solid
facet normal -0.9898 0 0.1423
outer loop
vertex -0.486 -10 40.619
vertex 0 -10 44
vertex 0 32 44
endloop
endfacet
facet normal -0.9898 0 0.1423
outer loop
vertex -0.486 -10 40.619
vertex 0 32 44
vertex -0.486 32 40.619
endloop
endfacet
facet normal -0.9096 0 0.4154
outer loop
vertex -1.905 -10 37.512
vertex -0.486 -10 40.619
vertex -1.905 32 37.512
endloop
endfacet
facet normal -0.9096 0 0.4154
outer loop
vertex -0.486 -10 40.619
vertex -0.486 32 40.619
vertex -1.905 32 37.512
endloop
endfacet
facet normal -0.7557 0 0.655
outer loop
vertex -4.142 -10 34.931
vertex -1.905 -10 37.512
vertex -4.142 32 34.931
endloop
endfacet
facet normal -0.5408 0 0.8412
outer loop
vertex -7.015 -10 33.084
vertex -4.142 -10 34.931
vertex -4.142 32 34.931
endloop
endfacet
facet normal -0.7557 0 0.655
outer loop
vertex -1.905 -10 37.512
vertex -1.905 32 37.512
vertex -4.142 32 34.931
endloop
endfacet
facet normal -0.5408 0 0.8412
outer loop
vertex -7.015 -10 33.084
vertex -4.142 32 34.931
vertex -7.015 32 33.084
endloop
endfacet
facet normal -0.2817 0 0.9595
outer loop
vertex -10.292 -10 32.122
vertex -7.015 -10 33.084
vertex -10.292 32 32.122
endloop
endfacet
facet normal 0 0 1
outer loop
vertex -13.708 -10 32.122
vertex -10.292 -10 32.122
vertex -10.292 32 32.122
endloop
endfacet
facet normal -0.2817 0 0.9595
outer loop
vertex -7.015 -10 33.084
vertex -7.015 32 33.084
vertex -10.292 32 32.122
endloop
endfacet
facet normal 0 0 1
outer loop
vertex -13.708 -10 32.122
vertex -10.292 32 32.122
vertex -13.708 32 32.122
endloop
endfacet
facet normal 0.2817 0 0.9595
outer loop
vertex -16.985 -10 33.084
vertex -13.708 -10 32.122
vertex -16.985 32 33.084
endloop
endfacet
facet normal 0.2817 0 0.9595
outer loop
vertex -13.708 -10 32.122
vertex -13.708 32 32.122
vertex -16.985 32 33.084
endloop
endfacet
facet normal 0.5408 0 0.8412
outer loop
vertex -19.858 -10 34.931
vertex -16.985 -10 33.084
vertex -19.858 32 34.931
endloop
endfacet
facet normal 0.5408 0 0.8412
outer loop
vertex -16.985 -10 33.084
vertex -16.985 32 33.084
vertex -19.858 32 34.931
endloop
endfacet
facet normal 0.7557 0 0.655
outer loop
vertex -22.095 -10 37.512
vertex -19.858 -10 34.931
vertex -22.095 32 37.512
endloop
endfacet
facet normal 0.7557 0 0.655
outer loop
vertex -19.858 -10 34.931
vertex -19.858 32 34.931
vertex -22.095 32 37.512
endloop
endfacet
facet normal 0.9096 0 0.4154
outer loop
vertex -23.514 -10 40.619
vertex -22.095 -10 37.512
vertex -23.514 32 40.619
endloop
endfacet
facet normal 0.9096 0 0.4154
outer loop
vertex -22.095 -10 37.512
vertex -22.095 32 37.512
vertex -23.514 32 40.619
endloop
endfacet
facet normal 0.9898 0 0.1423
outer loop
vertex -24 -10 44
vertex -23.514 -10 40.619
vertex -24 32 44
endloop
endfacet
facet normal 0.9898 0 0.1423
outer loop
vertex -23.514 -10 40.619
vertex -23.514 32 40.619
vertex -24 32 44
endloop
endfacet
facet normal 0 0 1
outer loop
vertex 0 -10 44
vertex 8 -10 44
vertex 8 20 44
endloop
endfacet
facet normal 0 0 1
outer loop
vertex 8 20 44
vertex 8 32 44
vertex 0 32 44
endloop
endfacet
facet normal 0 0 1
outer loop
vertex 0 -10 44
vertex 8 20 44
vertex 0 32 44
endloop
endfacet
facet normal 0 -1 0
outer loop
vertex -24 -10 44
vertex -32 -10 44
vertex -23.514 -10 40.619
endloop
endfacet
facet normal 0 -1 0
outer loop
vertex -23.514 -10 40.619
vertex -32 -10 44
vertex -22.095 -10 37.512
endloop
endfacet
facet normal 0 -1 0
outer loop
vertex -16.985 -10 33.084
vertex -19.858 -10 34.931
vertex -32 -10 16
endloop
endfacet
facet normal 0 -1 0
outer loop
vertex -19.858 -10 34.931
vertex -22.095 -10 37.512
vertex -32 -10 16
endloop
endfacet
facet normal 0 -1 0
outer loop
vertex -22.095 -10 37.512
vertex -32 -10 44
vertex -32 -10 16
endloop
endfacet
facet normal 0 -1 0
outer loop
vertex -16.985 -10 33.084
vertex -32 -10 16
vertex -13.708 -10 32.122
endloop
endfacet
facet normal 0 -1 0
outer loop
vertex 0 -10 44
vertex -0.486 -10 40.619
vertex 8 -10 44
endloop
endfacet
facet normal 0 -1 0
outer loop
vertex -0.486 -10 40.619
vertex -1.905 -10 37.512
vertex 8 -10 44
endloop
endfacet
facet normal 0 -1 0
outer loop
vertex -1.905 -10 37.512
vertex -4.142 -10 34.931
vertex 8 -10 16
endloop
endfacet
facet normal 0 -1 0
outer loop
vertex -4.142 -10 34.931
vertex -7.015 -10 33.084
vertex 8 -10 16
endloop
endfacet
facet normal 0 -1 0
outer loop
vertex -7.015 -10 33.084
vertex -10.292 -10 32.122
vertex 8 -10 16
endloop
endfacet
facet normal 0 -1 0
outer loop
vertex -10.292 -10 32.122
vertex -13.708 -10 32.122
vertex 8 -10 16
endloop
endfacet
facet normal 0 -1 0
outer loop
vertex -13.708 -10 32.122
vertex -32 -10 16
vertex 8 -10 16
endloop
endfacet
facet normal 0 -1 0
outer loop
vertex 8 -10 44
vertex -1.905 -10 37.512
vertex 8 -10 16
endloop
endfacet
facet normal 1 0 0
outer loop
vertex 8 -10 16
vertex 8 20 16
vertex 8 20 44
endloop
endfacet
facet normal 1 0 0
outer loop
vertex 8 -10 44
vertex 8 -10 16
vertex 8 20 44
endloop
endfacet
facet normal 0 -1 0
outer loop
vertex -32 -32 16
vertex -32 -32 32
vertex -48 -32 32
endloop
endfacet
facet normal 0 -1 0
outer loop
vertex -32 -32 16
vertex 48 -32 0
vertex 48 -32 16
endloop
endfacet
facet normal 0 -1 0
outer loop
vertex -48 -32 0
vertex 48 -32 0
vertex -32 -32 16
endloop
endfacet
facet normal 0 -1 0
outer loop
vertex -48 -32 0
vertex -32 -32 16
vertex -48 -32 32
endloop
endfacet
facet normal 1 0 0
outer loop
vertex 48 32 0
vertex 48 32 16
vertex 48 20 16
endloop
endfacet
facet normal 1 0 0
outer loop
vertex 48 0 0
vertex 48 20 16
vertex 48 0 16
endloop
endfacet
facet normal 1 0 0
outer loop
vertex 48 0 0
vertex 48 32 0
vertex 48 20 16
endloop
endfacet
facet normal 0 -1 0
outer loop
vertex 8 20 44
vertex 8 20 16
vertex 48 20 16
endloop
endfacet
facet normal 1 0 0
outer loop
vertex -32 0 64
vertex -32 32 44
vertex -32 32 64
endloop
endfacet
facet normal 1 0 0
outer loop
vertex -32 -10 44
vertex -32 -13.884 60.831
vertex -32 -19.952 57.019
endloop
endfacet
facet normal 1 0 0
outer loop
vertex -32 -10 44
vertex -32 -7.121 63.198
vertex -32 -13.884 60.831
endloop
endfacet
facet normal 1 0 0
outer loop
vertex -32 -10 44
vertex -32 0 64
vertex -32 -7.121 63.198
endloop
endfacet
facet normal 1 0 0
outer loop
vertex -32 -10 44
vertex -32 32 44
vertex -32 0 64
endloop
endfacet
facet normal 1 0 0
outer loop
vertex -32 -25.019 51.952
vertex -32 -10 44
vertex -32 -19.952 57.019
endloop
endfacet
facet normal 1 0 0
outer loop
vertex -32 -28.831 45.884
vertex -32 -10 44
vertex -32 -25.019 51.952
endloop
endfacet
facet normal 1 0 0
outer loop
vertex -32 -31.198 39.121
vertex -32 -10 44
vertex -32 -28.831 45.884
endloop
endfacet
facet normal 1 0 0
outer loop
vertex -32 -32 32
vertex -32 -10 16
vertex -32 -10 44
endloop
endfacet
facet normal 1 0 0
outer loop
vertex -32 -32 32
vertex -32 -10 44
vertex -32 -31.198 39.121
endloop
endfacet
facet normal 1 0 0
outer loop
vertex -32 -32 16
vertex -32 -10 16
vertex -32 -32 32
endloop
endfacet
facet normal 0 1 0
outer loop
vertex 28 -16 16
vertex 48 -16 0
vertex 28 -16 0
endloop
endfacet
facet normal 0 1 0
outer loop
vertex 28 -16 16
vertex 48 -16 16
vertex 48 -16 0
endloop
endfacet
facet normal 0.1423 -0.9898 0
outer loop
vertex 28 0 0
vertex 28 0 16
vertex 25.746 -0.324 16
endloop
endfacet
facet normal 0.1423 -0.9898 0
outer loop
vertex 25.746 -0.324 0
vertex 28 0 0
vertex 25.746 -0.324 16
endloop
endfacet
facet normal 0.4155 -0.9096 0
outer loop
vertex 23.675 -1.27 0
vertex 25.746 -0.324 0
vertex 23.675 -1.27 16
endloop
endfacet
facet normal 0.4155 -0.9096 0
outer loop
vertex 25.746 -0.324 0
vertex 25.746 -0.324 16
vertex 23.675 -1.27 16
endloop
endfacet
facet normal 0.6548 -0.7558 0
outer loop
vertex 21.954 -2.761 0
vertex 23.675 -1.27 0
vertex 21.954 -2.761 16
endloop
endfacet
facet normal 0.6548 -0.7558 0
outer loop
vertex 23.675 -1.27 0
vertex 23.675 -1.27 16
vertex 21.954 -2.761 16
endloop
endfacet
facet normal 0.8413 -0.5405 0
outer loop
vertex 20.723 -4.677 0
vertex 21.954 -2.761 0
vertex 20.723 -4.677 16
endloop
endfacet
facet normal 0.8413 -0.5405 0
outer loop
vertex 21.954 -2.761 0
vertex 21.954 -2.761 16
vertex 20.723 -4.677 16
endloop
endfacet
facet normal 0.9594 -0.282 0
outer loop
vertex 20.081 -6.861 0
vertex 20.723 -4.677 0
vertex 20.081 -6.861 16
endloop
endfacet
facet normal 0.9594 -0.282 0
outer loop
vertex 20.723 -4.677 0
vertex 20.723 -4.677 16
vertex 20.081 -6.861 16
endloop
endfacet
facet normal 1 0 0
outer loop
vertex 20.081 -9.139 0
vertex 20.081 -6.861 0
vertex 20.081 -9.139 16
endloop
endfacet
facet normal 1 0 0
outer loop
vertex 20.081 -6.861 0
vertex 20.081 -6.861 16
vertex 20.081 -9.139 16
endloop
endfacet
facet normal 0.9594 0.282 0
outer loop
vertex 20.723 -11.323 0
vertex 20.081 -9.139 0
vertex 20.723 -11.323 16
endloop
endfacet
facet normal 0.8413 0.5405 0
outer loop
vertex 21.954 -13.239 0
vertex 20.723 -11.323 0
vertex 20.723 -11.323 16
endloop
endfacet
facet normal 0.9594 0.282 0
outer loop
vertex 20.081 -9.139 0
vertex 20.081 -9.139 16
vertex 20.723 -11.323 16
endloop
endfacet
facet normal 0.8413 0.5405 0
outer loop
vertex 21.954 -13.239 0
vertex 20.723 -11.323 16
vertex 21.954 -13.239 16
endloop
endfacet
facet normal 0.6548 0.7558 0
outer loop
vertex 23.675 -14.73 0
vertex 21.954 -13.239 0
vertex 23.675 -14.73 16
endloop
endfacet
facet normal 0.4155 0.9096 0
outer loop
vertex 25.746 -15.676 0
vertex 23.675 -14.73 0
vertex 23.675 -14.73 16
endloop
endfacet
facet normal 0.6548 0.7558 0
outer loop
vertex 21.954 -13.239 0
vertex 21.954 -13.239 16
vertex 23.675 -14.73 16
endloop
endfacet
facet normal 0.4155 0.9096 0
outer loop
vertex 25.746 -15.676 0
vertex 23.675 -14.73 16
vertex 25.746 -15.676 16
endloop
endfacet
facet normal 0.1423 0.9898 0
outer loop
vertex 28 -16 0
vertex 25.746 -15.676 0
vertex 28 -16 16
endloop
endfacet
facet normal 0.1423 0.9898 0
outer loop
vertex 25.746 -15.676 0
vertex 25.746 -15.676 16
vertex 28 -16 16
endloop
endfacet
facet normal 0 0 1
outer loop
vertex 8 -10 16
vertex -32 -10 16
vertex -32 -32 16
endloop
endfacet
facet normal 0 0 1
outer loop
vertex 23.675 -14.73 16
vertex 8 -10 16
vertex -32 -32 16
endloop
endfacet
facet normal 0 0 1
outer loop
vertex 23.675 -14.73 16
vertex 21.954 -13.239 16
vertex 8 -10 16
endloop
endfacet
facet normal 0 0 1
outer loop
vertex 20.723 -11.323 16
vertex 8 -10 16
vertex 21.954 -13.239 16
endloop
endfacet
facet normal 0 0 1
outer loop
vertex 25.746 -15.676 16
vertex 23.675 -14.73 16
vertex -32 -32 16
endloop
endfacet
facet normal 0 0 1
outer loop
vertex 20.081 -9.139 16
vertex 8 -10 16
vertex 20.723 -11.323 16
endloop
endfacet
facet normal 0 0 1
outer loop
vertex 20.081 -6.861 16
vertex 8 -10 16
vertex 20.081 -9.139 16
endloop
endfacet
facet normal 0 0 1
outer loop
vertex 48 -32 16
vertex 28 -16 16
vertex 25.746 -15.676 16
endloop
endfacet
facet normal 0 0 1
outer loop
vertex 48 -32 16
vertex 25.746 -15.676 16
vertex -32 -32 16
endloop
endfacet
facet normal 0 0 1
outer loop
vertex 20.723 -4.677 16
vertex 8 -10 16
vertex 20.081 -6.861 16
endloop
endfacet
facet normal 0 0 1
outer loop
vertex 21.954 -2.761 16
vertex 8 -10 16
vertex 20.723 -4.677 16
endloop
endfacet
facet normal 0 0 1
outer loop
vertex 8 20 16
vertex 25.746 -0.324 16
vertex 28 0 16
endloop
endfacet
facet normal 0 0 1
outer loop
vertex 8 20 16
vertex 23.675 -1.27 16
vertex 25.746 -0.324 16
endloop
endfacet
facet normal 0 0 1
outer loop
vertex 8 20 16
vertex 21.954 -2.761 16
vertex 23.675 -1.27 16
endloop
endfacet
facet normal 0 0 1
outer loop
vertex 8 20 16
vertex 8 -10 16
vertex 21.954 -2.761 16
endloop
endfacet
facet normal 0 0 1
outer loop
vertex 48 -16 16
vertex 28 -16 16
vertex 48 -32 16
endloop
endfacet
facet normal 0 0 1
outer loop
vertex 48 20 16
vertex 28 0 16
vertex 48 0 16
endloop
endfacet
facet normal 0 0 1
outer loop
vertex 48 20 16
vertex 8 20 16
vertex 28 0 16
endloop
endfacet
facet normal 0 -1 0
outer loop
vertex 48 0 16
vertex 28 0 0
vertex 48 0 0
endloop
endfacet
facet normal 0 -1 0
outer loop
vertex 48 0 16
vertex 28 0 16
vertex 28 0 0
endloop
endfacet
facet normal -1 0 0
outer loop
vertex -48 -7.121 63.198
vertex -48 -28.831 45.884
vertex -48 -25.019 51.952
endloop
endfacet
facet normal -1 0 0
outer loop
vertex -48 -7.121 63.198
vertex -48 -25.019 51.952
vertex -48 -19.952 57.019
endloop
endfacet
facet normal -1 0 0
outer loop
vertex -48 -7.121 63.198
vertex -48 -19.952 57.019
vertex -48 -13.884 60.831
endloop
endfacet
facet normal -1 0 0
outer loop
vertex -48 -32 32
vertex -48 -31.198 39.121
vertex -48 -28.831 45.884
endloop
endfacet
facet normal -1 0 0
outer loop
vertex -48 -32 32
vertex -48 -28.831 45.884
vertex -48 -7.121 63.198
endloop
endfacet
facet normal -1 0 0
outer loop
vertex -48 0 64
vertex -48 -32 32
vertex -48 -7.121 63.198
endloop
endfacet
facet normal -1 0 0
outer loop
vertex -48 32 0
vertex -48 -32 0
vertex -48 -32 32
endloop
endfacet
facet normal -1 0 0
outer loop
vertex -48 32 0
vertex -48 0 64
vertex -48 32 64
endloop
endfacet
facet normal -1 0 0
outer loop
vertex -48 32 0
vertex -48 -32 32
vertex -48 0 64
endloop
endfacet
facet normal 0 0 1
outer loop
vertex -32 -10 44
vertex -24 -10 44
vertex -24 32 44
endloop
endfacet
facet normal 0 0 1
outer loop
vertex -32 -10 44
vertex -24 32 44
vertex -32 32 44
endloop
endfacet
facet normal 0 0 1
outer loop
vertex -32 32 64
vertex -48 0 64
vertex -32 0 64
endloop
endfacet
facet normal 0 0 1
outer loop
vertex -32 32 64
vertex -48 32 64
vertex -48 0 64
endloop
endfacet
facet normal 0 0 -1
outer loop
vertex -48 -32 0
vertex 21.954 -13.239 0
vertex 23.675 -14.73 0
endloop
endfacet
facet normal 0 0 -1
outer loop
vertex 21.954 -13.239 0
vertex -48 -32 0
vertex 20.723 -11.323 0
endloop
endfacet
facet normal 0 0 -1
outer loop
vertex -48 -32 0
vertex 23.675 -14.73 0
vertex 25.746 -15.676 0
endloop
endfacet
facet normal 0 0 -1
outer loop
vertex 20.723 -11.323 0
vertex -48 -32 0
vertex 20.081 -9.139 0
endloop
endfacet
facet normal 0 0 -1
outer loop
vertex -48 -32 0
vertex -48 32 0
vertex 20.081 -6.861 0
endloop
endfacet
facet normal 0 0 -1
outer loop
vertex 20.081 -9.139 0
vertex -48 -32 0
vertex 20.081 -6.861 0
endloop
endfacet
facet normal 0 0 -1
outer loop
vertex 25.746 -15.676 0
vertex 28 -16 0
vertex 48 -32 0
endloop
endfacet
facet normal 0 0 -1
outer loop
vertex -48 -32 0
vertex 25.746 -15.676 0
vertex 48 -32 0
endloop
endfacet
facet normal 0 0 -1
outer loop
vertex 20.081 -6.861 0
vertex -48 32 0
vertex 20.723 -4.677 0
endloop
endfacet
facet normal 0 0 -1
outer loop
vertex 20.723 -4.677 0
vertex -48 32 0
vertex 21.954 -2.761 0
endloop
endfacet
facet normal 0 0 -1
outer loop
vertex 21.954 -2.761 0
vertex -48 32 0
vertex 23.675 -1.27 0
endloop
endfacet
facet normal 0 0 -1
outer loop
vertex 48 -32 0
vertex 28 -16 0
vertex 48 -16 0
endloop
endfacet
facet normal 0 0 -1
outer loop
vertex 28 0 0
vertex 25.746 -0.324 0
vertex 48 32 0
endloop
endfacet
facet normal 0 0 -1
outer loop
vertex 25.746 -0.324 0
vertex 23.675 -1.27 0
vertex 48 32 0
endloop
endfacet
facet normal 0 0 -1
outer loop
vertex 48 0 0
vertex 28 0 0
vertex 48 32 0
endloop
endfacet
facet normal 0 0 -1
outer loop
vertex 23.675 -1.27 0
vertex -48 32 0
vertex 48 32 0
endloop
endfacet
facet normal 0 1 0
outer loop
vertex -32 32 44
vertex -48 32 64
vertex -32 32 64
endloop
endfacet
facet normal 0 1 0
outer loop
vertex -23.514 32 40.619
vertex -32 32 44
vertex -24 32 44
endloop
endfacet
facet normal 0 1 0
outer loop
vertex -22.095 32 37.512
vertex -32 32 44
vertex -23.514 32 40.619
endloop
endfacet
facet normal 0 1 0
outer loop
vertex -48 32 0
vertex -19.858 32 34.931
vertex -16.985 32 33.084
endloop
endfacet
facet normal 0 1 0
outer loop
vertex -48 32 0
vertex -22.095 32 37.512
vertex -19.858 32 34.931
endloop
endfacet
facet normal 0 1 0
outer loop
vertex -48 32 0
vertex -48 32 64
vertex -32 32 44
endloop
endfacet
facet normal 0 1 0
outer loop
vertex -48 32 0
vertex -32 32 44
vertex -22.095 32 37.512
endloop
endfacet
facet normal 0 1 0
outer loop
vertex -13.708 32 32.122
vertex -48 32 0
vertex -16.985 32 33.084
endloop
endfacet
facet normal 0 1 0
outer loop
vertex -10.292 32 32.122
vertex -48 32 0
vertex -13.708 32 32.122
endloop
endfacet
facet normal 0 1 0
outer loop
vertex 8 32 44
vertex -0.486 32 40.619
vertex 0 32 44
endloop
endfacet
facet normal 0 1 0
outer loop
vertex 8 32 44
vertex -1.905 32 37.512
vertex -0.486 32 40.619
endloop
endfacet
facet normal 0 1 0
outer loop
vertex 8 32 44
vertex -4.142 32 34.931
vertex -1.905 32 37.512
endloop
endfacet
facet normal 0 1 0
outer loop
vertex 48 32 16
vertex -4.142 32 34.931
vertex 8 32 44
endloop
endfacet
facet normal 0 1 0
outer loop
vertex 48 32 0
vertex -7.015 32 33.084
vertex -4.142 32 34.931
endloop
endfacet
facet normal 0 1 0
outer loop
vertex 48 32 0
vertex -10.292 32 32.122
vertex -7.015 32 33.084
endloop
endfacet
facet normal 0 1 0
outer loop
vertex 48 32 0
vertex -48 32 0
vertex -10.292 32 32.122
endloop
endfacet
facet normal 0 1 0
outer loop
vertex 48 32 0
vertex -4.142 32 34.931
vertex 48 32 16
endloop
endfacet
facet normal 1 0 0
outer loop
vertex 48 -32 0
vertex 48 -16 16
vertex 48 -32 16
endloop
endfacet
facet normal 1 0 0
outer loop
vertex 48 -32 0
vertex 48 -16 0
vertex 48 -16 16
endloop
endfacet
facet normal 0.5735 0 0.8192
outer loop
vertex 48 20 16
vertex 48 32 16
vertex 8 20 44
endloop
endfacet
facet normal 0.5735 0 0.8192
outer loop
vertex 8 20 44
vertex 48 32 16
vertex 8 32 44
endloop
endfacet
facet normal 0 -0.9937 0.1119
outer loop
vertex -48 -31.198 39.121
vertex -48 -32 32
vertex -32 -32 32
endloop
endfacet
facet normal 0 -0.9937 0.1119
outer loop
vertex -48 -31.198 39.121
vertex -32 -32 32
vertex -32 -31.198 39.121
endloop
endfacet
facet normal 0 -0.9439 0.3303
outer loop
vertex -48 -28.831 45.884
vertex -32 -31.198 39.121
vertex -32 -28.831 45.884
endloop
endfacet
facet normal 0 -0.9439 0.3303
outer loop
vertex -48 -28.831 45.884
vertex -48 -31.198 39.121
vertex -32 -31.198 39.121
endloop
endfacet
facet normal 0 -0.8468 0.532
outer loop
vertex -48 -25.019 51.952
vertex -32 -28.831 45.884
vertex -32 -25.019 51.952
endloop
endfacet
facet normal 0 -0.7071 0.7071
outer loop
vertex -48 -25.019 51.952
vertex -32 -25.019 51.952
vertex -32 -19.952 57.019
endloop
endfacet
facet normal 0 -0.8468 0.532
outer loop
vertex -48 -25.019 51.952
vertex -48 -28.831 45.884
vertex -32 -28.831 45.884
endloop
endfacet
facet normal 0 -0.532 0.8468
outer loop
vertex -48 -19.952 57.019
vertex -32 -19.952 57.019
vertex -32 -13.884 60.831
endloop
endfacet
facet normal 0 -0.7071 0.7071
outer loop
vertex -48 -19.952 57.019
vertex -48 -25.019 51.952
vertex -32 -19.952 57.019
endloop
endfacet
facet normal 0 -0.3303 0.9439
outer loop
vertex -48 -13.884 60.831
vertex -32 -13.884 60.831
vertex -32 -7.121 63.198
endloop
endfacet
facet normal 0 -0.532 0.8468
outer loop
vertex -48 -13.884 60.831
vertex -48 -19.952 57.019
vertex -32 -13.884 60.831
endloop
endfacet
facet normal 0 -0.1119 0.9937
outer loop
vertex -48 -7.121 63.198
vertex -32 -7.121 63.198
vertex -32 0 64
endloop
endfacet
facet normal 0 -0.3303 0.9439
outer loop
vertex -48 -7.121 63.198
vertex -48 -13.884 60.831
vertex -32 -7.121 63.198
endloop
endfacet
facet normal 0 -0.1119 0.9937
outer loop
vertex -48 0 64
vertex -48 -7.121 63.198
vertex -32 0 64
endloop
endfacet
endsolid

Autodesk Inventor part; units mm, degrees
ref_plane "YZ Plane" through (0, 0, 0) normal (1, 0, 0) x (0, 1, 0)
ref_plane "XZ Plane" through (0, 0, 0) normal (0, 1, 0) x (-1, 0, 0)
ref_plane "XY Plane" through (0, 0, 0) normal (0, 0, 1) x (1, 0, 0)
sketch "Sketch1" plane through (0, 0, 0) normal (0, 0, 1) x (1, 0, 0)
  line L0 (48, -32) -> (-48, -32)
  line L1 (-48, -32) -> (-48, 32)
  line L2 (-48, 32) -> (48, 32)
  line L3 (48, 32) -> (48, -32)
  line L4 (48, -32) -> (-48, 32) construction
  line L5 (-48, -32) -> (48, 32) construction
  point P0 (0, 0)
  dimension "d0" = 96
  dimension "d1" = 64
extrude "Extrusion1" add sketch "Sketch1" along normal blind 16
sketch "Sketch2" plane through (0, 0, 16) normal (0, 0, 1) x (1, 0, 0)
  point P0 (0, 0)
sketch "Sketch3" plane through (0, 0, 16) normal (0, 0, 1) x (1, 0, 0)
  line L0 (48, 32) -> (-48, 32) projected
  line L1 (-48, 32) -> (-32, 32)
  line L2 (-32, 32) -> (-32, -32)
  line L3 (-32, -32) -> (-48, -32)
  line L4 (-48, -32) -> (-48, 32)
  line L5 (-48, -32) -> (48, -32) projected
  point P0 (0, 0)
  dimension "d4" = 16
extrude "Extrusion2" add sketch "Sketch3" along normal blind 48
fillet "Fillet1" radius 32 1 edges at (-40, -32, 64)
sketch "Sketch4" plane through (-48, 32, 0) normal (0, 1, 0) x (1, 0, 0)
  line L0 (16, -16) -> (96, -16) projected
  line L1 (16, -16) -> (56, -16)
  line L2 (56, -16) -> (56, -44)
  line L3 (16, -44) -> (16, -16)
  arc A0 (48, -44) -> (24, -44) centre (36, -44) ccw
  line L4 (56, -44) -> (48, -44)
  line L5 (24, -44) -> (16, -44)
  point P0 (48, 0)
  dimension "d8" = 40
  dimension "d9" = 28
  dimension "d10" = 24
extrude "Extrusion3" add sketch "Sketch4" against normal blind 42
sketch "Sketch5" plane through (-48, 32, 0) normal (0, 1, 0) x (1, 0, 0)
  line L0 (56, -16) -> (56, -44) projected
  line L1 (56, -44) -> (56, -16)
  line L2 (96, -16) -> (56, -16) projected
  line L3 (56, -16) -> (96, -16)
  line L4 (96, -16) -> (56, -44)
  point P0 (48, 0)
extrude "Extrusion4" add sketch "Sketch5" against normal blind 12
sketch "Sketch6" plane through (0, 0, 16) normal (0, 0, 1) x (1, 0, 0)
  line L0 (48, -32) -> (48, 20) projected
  line L1 (48, -16) -> (28, -16)
  arc A0 (28, 0) -> (28, -16) centre (28, -8) ccw
  line L2 (28, 0) -> (48, 0)
  line L3 (-32, -32) -> (48, -32) projected
  point P0 (0, 0)
  dimension "d15" = 20
  dimension "d16" = 16
  dimension "d17" = 16
extrude "Extrusion5" cut sketch "Sketch6" against normal blind 16
properties part number "Practical 1"
